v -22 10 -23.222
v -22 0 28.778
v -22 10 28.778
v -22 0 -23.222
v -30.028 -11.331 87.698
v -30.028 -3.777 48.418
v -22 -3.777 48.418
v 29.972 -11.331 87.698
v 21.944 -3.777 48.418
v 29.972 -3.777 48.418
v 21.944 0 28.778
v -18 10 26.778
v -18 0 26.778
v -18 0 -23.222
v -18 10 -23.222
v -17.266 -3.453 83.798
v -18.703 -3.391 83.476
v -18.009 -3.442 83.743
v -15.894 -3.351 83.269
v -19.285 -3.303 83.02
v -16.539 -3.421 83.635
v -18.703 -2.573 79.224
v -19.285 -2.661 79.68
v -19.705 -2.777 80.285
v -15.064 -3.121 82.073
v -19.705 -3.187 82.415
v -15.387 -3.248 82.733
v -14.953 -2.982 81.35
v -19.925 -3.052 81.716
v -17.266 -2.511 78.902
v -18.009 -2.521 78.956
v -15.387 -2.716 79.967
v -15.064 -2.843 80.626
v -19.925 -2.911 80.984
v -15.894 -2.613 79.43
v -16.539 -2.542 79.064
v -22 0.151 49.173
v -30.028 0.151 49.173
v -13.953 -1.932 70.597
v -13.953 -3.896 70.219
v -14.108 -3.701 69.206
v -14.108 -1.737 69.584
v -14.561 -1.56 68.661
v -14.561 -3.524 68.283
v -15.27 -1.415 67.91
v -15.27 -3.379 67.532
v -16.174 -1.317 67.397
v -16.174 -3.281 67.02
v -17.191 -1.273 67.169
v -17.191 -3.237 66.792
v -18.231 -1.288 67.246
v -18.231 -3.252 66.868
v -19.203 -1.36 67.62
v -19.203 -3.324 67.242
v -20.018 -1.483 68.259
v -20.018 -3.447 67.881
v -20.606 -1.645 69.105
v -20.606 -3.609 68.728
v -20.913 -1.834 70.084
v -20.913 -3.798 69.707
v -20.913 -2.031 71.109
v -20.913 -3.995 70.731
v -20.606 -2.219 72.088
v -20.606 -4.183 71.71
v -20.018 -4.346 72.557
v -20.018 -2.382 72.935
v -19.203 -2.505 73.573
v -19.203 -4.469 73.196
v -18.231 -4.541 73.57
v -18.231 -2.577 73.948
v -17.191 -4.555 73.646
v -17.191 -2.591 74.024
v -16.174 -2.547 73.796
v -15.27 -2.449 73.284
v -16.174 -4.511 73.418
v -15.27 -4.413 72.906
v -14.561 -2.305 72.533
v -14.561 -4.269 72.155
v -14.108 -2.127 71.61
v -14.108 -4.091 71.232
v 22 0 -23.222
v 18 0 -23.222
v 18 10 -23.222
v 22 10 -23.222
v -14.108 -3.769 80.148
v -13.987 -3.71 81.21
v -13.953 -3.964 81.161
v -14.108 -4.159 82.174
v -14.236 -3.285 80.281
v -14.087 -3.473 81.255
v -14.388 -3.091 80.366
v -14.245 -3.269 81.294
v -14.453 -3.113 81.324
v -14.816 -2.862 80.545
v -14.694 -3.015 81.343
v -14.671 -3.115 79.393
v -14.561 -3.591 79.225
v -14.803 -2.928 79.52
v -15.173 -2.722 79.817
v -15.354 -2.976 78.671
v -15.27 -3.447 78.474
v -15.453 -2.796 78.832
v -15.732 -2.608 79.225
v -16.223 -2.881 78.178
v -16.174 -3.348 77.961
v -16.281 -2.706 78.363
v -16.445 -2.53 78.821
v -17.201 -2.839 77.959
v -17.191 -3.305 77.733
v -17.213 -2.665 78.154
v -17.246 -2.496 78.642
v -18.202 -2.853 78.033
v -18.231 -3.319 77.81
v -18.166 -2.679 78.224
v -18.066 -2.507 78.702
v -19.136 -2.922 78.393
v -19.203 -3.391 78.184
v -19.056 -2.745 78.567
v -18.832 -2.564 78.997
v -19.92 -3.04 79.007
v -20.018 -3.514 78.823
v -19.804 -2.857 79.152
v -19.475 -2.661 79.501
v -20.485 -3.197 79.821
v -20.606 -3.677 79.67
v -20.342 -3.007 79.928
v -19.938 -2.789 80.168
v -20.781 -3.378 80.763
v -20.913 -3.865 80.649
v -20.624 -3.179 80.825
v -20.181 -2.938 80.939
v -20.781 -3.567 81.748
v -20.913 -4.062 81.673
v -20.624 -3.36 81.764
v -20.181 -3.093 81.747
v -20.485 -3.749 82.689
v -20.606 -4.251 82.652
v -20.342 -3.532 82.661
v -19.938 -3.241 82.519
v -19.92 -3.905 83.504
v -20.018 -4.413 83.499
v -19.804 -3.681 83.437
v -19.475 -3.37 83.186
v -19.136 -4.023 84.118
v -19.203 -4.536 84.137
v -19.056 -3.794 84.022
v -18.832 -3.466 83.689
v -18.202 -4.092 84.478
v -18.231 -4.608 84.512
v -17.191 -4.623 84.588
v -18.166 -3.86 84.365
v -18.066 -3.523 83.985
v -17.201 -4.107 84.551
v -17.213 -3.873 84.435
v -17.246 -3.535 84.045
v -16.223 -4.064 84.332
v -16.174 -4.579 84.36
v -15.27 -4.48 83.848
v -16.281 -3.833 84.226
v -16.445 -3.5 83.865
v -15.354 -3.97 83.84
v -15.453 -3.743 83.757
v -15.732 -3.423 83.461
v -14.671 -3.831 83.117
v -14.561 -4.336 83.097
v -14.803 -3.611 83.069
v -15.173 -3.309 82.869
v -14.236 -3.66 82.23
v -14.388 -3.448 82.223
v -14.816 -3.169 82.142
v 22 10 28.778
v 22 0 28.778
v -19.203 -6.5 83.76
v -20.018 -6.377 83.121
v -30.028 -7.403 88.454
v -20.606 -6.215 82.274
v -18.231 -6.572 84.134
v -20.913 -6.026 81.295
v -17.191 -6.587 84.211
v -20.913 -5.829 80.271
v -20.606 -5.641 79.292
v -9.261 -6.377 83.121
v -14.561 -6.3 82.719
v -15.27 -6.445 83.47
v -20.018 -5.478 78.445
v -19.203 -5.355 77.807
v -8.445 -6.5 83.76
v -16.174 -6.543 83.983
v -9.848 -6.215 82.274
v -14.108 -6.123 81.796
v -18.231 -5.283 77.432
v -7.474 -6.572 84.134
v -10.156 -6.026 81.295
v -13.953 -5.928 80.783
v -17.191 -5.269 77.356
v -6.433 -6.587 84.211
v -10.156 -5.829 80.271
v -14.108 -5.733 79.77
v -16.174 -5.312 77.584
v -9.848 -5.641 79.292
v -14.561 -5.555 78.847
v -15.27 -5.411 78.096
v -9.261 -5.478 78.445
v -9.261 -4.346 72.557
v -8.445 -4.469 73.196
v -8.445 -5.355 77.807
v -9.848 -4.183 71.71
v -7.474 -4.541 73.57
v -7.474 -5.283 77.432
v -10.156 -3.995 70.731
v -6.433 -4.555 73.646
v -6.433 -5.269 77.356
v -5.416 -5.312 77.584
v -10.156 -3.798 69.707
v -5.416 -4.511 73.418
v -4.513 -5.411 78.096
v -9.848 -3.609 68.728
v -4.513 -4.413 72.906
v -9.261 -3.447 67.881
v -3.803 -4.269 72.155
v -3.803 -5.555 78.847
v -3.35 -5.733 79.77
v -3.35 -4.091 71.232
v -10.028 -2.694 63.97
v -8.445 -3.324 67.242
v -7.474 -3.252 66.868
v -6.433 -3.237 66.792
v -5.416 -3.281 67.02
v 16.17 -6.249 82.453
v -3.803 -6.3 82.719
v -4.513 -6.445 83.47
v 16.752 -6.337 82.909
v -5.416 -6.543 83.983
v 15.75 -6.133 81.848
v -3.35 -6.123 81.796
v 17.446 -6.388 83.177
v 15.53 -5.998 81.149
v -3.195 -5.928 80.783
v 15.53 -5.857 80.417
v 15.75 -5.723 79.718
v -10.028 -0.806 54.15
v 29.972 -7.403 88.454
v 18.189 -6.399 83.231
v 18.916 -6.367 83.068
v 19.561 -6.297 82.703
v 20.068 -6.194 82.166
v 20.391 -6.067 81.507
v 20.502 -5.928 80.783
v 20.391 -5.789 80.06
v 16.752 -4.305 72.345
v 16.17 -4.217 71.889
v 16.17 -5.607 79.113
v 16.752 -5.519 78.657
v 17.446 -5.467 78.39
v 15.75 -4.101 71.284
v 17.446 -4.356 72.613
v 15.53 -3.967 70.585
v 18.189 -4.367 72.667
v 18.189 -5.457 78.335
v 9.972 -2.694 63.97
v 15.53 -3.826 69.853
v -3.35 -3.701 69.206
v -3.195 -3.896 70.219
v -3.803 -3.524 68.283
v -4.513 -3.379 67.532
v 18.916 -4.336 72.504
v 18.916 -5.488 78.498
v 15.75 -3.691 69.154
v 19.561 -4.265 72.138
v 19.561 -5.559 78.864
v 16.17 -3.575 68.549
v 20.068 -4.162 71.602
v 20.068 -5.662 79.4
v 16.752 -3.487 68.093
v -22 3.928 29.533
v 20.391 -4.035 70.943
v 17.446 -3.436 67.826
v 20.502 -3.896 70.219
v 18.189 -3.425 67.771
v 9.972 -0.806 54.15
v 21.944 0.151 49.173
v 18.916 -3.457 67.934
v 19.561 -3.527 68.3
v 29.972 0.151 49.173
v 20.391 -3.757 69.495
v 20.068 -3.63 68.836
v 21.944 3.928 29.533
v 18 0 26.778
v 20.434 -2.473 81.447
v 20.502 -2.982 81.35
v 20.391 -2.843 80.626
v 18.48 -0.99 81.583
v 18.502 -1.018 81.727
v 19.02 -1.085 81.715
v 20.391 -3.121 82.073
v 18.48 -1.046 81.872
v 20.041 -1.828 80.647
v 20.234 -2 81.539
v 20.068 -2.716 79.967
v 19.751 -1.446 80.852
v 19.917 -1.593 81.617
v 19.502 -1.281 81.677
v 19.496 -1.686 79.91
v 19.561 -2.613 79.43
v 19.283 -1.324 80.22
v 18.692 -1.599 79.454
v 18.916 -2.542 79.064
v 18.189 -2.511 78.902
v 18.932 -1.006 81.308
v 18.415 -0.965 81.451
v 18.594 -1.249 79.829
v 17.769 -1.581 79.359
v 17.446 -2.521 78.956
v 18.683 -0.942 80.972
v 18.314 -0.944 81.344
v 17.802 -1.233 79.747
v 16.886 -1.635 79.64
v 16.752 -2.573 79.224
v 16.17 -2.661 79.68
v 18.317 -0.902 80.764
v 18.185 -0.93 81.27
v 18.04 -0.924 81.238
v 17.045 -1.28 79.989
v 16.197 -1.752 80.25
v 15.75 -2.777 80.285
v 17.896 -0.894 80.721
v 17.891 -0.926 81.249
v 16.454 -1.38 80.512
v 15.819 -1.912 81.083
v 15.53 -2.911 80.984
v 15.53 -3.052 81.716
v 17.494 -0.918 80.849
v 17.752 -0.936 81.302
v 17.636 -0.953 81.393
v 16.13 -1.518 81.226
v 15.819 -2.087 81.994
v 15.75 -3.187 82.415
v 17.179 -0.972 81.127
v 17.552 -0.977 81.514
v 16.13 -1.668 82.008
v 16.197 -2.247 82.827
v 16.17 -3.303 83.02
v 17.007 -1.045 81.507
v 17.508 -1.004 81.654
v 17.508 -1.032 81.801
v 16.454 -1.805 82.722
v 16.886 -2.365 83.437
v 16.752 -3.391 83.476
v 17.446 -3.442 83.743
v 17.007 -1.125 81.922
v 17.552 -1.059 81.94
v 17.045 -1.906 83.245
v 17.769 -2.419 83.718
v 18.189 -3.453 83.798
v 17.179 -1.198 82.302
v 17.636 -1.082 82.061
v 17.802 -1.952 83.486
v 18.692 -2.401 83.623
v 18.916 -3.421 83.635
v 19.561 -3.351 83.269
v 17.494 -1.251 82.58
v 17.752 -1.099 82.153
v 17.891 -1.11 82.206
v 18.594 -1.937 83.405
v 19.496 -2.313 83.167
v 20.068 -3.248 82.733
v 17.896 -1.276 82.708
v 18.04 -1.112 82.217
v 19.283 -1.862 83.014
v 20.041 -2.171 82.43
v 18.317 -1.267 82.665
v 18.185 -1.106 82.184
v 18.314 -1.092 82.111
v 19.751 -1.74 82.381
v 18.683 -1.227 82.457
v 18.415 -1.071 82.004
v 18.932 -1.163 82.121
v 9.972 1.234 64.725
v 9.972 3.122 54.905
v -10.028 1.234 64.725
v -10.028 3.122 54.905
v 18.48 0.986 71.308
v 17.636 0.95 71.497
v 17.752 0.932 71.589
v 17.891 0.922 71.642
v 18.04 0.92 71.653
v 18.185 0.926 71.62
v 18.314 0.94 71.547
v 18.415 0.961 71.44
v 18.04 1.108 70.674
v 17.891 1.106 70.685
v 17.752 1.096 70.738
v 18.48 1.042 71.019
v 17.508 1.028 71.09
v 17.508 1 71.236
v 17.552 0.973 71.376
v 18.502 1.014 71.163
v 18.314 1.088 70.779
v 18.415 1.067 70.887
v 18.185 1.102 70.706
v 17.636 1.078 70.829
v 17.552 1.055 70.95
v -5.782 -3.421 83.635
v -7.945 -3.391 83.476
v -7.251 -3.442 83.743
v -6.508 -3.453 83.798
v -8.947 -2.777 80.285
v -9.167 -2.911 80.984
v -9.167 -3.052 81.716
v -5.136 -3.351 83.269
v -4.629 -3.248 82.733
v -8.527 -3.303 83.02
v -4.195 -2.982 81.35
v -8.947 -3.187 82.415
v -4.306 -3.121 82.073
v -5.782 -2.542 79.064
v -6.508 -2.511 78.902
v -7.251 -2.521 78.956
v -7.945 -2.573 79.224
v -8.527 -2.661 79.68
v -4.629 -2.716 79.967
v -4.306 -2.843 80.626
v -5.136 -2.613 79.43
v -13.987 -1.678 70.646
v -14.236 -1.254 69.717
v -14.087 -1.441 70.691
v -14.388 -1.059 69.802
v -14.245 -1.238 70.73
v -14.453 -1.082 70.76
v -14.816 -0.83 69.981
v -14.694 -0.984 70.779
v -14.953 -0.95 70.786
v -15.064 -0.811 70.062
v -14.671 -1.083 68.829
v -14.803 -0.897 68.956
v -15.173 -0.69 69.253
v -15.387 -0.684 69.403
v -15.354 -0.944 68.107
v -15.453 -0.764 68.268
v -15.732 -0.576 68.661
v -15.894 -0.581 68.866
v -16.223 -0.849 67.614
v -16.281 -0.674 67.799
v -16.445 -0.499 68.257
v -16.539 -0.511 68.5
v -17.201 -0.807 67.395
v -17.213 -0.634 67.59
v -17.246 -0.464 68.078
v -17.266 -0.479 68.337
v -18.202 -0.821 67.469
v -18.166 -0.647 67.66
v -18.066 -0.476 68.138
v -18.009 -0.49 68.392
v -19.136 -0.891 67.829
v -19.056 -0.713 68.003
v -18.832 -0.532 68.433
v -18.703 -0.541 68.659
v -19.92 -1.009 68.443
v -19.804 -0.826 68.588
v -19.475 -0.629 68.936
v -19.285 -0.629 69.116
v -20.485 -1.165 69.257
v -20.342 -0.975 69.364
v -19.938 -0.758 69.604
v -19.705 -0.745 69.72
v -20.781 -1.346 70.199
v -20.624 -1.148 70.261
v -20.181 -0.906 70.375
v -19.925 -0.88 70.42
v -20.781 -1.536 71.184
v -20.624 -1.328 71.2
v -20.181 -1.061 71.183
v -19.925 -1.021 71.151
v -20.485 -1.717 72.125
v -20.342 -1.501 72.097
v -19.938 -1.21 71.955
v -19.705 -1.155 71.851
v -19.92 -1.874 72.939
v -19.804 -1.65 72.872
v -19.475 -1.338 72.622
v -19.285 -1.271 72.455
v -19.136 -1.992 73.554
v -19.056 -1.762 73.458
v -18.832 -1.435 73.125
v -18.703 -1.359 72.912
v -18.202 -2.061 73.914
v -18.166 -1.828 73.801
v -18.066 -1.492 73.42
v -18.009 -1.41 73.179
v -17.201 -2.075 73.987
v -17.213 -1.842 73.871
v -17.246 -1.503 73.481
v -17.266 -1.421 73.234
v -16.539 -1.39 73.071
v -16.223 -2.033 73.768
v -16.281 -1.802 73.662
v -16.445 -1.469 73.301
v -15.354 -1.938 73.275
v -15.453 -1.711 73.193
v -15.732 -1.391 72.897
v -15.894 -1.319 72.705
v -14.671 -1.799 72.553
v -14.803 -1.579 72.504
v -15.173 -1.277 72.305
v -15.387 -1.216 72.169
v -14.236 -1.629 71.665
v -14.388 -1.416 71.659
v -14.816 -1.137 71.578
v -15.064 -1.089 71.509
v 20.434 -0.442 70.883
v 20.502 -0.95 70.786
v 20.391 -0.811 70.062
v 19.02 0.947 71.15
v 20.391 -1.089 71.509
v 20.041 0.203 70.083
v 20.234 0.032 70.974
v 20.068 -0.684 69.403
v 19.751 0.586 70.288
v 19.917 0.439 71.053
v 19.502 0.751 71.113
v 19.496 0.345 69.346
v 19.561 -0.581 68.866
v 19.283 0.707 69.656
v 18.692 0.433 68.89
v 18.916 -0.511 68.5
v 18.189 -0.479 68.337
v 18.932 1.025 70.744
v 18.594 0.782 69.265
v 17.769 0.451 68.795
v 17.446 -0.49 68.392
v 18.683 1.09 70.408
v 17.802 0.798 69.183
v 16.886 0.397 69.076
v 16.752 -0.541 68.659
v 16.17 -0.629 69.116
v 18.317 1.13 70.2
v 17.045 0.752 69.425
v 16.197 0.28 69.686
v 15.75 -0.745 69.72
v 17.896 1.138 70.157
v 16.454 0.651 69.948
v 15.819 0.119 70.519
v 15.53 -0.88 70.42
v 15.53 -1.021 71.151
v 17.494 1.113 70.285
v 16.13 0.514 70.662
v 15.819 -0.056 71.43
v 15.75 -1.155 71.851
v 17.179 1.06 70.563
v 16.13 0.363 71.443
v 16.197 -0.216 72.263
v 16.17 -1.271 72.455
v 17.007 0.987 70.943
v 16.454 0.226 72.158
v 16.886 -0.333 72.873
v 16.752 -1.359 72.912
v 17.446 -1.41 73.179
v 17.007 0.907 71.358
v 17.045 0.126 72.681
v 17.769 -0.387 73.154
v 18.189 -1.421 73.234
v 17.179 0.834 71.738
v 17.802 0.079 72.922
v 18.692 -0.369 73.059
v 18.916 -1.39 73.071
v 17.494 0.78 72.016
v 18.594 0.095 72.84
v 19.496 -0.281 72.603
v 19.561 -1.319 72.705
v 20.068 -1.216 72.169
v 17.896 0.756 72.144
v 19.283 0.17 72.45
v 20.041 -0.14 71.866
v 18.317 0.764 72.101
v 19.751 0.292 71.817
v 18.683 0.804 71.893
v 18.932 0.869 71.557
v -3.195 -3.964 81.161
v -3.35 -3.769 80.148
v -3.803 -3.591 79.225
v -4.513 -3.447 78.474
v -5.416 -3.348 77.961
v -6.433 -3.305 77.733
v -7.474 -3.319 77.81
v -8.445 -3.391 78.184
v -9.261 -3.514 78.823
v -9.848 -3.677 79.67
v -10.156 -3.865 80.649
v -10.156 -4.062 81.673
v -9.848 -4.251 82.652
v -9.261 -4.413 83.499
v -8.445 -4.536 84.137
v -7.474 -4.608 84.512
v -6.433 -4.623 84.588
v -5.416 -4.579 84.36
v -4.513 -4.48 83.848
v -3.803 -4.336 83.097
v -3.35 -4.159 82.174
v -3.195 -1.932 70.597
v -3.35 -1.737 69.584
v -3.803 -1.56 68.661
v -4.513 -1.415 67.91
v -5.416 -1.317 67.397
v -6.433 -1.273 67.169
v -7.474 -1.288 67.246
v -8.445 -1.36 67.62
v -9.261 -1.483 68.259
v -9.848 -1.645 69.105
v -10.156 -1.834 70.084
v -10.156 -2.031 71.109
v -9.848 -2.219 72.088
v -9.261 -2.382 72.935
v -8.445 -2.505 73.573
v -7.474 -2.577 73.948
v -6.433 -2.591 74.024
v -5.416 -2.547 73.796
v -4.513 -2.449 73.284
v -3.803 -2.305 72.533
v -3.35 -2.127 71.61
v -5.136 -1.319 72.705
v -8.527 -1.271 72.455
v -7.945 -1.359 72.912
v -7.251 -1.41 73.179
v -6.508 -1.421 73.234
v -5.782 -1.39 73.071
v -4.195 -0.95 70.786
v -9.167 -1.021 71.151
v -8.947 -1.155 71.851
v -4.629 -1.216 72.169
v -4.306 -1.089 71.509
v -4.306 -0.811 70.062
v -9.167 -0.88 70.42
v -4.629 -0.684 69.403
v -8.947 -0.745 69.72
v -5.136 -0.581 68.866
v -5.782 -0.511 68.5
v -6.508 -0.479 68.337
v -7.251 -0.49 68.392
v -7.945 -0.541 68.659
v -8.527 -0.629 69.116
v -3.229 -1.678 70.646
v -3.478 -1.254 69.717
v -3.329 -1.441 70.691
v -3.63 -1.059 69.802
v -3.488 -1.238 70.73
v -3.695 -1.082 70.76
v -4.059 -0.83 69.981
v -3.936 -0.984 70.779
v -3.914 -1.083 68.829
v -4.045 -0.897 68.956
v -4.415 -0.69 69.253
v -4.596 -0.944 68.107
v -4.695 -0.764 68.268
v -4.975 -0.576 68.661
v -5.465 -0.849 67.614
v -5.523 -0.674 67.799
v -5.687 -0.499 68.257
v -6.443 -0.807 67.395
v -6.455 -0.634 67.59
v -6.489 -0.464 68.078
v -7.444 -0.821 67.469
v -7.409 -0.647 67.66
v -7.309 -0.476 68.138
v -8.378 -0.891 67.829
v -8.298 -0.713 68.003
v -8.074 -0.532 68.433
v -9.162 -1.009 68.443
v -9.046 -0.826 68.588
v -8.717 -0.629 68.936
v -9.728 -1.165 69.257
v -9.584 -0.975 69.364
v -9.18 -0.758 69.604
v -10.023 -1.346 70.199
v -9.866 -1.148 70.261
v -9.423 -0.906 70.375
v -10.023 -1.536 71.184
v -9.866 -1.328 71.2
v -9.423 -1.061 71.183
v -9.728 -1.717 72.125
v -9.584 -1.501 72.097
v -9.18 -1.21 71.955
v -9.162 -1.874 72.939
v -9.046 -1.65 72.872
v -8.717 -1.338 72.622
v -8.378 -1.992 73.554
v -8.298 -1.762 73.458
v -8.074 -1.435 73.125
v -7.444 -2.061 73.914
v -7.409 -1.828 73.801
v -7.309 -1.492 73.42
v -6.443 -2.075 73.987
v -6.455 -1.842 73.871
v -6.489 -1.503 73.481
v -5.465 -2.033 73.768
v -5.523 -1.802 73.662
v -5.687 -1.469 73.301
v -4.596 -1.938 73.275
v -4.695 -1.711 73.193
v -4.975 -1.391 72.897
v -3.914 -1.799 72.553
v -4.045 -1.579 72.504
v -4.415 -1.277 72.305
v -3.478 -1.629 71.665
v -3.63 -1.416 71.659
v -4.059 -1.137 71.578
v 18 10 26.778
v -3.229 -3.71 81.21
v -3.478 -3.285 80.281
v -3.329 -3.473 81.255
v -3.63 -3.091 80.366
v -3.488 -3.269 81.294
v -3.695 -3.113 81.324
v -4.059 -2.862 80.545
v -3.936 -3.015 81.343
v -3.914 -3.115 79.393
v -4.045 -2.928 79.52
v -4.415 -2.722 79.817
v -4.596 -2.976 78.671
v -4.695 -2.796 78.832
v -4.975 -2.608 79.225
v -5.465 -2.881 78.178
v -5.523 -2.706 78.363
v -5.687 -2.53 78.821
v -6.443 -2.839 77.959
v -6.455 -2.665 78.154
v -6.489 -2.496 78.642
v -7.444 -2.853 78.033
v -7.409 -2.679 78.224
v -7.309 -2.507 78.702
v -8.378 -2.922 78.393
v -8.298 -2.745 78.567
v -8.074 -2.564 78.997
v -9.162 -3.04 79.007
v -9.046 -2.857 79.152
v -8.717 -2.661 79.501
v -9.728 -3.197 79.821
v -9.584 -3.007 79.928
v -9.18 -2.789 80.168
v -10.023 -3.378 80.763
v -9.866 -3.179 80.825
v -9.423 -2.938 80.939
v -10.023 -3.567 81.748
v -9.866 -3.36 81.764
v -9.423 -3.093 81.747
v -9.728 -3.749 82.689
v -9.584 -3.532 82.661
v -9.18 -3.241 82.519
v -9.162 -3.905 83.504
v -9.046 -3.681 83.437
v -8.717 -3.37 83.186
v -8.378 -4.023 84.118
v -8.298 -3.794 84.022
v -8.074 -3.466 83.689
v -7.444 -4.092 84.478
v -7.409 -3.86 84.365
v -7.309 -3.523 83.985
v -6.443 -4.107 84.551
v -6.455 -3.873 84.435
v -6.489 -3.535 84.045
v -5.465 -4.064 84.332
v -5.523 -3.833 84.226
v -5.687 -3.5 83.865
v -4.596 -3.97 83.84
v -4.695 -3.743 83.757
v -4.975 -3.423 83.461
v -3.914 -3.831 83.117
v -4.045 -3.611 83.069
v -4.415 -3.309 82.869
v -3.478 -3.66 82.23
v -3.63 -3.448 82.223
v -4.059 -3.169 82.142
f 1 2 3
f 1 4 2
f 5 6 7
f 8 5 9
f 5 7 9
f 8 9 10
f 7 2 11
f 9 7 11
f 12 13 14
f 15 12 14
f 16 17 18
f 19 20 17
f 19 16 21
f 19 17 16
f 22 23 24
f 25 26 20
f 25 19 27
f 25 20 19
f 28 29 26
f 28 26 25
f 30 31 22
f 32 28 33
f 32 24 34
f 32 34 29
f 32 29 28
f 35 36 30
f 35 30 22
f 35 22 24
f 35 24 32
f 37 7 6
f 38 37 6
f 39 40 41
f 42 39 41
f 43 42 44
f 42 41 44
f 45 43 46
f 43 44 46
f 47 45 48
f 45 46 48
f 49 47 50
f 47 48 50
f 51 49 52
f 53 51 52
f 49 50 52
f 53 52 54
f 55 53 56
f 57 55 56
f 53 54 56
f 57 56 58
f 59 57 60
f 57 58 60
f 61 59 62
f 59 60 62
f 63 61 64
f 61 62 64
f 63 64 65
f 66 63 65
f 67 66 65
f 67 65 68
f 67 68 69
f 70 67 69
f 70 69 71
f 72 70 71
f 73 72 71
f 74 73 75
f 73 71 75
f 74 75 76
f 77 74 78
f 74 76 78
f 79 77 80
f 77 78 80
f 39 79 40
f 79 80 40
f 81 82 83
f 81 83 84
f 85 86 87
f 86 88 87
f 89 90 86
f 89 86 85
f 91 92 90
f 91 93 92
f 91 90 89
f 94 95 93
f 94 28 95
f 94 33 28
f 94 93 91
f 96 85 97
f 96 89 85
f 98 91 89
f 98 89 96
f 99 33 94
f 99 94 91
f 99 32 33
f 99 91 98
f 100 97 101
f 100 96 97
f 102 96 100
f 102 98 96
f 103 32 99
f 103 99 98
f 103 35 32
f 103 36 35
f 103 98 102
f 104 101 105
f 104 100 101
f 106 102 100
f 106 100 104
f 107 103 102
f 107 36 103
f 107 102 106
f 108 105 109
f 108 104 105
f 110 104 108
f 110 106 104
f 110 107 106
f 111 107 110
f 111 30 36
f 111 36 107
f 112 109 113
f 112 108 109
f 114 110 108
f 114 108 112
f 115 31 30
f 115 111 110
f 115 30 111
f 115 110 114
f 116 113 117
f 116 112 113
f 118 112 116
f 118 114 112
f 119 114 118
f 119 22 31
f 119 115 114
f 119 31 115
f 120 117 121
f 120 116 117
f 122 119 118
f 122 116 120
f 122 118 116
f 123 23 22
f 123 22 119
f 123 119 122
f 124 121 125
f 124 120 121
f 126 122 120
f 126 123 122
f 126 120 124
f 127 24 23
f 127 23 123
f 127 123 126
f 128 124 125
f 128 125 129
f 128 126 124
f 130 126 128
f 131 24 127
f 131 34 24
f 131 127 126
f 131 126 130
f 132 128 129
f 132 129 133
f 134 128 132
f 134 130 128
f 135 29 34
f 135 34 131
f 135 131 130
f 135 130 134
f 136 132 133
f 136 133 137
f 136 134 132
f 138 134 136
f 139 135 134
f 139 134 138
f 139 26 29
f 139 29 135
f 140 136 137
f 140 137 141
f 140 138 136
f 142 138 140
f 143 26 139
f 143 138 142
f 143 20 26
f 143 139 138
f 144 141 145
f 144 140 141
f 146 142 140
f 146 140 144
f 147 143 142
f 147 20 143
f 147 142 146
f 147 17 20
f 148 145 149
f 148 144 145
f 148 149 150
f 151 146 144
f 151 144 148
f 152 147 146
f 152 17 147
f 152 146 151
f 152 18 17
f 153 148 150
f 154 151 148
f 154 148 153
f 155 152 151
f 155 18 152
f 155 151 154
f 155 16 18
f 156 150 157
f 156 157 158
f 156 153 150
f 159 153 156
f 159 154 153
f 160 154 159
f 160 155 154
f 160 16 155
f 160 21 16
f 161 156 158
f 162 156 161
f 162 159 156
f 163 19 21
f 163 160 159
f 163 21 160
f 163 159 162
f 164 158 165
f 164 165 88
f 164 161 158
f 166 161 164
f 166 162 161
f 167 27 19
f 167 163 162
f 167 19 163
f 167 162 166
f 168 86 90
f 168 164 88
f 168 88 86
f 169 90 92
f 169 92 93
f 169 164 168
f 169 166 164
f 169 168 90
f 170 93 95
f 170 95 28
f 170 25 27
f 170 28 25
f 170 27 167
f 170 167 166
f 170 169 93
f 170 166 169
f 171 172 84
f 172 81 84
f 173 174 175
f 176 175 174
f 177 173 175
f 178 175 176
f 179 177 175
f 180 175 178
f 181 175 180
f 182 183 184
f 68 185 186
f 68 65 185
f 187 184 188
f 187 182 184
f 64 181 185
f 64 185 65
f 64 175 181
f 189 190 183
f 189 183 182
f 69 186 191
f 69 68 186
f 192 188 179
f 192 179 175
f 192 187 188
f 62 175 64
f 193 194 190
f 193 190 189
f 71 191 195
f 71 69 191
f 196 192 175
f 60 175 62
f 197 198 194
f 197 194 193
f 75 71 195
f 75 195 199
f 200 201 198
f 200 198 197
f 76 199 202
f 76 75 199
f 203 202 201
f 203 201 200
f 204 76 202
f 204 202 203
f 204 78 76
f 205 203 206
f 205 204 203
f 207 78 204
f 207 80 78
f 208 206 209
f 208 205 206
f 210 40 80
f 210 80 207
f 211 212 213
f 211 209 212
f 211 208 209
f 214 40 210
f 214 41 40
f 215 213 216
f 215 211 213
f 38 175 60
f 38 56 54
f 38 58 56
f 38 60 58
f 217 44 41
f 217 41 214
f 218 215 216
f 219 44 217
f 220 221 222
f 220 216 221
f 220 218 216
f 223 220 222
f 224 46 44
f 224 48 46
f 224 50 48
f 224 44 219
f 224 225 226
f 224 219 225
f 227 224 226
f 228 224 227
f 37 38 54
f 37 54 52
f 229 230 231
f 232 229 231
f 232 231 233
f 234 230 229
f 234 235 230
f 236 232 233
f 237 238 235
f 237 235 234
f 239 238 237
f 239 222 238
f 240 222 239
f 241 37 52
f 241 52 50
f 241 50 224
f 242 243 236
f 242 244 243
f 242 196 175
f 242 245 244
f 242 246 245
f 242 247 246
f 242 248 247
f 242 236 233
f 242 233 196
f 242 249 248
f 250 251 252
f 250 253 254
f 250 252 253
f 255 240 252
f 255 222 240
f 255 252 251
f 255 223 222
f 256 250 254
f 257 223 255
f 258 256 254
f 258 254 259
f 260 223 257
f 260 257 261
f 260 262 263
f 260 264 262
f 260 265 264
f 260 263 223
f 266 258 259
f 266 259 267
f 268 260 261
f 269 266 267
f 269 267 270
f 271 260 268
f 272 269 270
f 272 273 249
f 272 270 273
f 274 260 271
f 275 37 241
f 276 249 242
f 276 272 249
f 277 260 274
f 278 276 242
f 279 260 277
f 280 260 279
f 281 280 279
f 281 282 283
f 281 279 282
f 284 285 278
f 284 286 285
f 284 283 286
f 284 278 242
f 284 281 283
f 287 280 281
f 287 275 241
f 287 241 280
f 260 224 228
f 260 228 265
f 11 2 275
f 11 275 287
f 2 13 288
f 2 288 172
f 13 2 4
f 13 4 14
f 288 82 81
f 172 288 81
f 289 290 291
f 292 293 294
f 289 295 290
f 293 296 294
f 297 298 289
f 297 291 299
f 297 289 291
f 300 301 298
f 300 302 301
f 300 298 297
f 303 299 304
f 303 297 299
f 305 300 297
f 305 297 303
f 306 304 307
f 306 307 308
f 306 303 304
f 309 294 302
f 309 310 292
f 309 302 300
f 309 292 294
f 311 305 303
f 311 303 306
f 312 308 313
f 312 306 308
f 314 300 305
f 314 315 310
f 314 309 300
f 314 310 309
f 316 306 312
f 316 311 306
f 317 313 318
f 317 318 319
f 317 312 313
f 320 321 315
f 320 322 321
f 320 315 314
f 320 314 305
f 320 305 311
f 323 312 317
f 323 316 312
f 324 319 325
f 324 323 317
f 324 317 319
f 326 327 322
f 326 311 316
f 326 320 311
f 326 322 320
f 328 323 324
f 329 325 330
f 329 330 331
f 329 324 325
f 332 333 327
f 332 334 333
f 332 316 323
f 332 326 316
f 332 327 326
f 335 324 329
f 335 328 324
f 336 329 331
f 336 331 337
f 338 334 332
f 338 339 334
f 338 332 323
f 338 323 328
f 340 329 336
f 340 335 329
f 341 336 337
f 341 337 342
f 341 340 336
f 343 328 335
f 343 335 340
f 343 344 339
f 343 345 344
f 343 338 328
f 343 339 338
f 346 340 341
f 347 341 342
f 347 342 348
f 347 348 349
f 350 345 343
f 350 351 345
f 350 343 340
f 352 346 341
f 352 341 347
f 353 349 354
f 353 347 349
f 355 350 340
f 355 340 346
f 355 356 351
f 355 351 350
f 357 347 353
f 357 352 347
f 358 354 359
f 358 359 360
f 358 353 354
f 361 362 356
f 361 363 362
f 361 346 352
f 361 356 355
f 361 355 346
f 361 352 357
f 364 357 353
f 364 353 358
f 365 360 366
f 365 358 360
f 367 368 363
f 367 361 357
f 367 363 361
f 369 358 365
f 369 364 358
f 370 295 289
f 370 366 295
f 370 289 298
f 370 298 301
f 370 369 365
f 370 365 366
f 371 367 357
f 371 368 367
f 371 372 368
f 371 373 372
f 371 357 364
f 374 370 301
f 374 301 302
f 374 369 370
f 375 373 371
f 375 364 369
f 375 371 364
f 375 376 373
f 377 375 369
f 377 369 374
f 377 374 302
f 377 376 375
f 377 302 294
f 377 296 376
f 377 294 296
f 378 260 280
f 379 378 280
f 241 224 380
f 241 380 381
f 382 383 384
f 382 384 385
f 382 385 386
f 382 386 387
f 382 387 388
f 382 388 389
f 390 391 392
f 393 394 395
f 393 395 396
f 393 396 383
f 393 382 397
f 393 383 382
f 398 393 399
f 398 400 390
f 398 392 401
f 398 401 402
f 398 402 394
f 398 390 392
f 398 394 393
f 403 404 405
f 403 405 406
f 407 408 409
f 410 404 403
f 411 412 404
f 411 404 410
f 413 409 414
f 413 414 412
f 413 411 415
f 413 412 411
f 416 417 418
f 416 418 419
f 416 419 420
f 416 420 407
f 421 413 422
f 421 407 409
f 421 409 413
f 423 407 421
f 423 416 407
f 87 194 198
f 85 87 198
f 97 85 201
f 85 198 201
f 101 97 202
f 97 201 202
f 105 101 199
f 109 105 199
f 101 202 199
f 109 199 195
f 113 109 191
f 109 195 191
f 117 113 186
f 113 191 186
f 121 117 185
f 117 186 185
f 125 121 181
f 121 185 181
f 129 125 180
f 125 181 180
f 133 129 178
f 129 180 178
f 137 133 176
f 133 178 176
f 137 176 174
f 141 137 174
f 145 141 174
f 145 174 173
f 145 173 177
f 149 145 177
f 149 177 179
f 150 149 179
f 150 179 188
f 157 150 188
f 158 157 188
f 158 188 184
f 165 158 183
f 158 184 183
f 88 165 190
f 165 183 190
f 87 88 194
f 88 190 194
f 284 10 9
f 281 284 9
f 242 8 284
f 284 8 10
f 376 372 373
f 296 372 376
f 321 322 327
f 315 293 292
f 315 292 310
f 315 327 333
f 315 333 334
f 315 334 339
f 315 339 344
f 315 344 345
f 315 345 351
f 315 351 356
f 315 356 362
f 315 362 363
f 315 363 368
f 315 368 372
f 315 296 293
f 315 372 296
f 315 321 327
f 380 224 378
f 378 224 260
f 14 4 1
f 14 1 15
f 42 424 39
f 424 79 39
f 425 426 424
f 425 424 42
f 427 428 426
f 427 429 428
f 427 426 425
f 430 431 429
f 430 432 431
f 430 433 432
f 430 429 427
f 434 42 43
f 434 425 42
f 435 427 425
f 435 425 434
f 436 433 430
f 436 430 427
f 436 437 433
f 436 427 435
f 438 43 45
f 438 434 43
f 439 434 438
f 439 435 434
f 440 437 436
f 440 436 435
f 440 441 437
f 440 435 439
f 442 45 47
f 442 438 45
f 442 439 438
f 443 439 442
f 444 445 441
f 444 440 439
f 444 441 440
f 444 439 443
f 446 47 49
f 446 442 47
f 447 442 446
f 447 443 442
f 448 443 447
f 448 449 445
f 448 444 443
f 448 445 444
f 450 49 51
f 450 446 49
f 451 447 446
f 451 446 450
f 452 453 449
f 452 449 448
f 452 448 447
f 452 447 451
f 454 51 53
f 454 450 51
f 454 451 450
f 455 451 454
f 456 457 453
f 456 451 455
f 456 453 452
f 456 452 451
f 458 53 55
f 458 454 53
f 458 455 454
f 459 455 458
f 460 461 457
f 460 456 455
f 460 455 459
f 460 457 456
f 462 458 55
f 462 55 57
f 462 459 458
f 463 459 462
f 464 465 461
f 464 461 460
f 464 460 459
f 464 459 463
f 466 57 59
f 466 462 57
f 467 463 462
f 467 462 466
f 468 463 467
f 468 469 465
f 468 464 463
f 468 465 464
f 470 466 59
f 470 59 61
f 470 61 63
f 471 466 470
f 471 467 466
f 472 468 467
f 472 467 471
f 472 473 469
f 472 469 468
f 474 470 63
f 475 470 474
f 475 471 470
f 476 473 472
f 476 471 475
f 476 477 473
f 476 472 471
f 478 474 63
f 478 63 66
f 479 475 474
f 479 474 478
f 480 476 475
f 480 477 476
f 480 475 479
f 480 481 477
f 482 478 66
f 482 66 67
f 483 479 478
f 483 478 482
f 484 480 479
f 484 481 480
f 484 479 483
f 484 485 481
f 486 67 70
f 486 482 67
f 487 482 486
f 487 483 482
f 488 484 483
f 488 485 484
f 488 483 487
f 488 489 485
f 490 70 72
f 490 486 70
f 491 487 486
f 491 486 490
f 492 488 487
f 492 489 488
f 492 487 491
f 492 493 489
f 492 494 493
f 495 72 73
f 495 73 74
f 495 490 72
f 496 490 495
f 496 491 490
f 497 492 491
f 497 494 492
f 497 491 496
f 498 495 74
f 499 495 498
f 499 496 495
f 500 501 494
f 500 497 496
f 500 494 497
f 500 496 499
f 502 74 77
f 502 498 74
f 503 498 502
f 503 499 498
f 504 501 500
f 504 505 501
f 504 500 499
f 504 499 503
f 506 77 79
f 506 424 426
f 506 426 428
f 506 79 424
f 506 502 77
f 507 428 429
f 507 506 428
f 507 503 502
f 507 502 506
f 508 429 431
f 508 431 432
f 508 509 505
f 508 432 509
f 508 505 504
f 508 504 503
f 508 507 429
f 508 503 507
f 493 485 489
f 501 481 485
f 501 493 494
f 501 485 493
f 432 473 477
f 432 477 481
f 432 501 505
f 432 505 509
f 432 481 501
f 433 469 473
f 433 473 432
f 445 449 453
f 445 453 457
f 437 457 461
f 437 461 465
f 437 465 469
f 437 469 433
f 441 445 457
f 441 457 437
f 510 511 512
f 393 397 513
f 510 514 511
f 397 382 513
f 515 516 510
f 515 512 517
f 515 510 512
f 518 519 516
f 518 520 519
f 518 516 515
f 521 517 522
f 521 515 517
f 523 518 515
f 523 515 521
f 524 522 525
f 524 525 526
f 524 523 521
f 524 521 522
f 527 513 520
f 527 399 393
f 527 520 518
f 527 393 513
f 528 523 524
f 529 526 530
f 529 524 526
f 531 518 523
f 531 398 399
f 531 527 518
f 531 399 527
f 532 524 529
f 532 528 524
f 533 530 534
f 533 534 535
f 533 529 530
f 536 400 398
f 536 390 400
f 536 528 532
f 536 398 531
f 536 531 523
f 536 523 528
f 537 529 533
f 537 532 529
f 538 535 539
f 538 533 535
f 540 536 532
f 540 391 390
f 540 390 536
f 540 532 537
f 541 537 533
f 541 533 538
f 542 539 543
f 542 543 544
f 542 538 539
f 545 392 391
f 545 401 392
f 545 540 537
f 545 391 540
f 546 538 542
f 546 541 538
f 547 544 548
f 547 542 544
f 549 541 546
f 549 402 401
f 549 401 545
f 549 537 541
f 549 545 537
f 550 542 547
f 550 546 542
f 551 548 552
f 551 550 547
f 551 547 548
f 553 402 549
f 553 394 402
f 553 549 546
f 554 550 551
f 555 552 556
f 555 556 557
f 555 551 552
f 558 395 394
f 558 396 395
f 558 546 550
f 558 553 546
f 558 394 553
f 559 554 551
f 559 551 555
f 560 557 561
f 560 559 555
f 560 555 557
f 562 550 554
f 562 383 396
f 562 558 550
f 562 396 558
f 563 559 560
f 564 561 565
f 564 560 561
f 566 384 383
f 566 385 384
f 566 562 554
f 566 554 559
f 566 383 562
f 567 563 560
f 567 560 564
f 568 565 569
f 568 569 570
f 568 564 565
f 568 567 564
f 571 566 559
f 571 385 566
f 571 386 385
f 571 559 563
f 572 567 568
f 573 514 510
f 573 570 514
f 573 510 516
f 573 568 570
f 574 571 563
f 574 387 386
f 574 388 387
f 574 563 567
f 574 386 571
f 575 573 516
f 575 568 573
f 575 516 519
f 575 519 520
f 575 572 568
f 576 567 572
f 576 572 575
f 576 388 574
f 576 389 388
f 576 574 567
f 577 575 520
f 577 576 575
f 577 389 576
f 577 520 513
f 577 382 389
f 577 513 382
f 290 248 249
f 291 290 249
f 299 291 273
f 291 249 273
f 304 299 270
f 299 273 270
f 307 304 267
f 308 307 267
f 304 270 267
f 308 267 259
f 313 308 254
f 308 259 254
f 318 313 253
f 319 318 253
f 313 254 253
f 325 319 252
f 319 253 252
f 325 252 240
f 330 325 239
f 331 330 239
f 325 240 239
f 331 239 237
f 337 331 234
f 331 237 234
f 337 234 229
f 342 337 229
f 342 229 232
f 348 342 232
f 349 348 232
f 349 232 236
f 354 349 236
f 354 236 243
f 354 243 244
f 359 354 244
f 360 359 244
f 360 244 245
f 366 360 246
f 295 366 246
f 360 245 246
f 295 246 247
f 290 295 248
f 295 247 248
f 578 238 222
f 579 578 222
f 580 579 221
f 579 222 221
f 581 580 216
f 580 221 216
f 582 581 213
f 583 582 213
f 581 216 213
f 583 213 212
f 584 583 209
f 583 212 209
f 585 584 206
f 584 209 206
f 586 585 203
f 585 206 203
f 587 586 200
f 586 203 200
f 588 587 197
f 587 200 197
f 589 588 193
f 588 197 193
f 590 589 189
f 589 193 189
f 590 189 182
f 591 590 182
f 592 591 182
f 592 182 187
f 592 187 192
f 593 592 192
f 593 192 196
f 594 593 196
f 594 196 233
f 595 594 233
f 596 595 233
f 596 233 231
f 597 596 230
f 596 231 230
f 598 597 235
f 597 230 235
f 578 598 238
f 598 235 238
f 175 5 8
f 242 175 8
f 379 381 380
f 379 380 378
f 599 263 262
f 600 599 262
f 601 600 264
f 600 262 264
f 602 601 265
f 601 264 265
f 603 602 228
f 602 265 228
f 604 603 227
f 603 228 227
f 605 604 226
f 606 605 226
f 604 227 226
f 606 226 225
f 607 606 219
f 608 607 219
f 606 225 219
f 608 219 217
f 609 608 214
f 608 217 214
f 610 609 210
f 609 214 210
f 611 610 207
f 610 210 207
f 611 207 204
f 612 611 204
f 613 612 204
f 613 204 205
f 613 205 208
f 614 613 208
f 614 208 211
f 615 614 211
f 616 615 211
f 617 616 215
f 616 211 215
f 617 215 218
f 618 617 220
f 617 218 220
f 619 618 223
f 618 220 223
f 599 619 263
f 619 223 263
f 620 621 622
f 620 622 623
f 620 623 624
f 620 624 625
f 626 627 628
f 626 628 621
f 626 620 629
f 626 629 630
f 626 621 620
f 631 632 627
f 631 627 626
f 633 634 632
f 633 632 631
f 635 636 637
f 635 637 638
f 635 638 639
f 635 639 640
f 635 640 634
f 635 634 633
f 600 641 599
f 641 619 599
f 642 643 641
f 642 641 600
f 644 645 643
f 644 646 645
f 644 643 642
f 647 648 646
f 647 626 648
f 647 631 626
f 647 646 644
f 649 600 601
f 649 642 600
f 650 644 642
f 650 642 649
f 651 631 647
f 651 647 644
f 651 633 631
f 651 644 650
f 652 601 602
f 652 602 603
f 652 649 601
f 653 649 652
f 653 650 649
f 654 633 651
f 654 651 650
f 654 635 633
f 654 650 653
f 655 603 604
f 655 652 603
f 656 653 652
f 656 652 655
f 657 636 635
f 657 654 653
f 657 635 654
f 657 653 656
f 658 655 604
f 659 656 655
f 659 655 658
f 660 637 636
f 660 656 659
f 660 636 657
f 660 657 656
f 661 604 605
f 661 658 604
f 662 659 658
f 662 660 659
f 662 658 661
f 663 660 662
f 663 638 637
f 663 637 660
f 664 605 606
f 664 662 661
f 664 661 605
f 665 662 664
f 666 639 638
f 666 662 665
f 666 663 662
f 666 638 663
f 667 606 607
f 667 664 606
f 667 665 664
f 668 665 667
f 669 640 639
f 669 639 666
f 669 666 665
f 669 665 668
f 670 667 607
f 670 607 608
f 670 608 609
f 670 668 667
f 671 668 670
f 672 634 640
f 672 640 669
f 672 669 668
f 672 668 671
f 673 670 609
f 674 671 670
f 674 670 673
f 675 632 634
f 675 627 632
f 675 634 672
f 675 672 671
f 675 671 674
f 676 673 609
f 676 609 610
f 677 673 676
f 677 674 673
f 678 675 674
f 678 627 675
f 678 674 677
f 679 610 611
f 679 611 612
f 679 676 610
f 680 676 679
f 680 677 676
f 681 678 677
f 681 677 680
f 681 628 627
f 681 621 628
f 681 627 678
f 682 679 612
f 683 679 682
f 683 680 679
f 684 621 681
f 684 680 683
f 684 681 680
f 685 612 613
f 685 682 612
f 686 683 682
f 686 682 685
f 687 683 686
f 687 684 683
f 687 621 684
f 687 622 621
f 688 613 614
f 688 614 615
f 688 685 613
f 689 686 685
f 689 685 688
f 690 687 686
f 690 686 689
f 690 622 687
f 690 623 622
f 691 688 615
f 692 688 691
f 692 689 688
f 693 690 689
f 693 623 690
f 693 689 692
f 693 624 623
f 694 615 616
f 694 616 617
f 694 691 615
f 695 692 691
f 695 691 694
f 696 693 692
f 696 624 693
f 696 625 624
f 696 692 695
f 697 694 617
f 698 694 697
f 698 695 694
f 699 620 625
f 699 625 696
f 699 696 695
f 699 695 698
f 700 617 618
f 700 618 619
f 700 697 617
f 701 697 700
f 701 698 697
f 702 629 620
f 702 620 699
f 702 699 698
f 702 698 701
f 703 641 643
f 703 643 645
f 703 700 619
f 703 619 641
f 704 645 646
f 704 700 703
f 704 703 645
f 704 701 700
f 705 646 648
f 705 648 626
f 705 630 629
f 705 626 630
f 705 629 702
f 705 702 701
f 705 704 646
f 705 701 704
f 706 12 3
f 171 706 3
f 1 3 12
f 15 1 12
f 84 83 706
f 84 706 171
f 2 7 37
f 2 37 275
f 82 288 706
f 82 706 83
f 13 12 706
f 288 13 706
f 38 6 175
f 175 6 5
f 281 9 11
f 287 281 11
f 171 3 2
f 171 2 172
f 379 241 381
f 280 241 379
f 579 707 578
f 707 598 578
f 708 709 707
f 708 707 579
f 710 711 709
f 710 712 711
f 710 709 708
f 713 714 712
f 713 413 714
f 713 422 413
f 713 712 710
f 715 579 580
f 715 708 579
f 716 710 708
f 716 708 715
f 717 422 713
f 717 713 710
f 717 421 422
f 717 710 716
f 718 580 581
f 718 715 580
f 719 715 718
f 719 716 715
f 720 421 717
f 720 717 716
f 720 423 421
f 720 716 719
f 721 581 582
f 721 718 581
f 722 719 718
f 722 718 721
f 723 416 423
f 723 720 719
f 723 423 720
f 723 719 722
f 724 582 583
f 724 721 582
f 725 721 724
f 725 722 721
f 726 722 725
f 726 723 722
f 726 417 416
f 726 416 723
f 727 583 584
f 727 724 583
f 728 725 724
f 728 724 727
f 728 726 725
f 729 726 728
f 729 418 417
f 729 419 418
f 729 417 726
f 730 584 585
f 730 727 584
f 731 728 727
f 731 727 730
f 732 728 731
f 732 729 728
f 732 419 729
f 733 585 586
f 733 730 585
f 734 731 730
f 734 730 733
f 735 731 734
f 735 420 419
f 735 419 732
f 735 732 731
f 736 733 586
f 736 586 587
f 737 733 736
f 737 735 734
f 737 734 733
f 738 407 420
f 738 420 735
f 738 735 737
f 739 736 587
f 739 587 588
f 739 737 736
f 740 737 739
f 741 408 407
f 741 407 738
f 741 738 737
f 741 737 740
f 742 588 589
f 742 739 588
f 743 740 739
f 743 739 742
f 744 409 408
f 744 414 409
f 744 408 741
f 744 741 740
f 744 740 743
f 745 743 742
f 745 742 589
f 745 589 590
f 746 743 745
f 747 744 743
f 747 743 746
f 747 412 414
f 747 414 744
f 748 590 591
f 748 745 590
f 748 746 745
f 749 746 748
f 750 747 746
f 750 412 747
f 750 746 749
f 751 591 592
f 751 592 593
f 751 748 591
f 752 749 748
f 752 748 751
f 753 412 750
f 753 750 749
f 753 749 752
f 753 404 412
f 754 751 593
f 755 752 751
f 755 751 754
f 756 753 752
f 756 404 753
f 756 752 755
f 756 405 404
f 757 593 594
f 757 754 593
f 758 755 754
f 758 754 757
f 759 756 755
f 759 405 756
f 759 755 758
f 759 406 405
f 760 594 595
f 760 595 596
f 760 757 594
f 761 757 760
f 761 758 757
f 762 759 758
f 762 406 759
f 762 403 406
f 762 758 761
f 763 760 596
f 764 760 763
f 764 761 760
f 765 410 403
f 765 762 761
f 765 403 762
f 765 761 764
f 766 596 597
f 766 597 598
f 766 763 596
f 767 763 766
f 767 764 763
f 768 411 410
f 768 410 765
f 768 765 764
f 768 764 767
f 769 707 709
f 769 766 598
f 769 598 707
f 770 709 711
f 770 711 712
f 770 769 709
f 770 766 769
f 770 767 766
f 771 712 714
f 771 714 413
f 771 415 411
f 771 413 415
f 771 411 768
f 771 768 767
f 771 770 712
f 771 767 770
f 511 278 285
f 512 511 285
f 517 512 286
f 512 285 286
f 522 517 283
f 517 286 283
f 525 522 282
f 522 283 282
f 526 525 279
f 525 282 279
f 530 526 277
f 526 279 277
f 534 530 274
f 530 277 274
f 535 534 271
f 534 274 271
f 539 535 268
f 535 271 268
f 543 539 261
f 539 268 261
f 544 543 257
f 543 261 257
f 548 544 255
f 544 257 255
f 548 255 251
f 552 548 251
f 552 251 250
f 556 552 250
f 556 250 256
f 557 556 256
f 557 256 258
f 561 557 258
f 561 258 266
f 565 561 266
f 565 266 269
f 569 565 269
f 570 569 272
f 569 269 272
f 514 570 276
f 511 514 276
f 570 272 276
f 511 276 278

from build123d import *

# Parameters (mm, degrees)
SKETCH1_W             = 4
SKETCH1_H             = 50
BOSS_EXTRUDE1_DEPTH   = 10
BOSS_EXTRUDE1_2_DEPTH = 10
SKETCH2_W             = 44
SKETCH2_H             = 10
BOSS_EXTRUDE2_DEPTH   = 2
BOSS_EXTRUDE3_DEPTH   = 4
SKETCH4_W             = 20
SKETCH4_H             = 10
BOSS_EXTRUDE4_DEPTH   = 4
SKETCH4_3_R           = 3.5
BOSS_EXTRUDE5_DEPTH   = 3
SKETCH4_4_R           = 3.5
BOSS_EXTRUDE6_DEPTH   = 3
SKETCH4_5_R           = 2.5
BOSS_EXTRUDE7_DEPTH   = 5
FILLET1_R             = 2
FILLET2_R             = 1


with BuildPart() as part:
    # Sketch1 → Boss-Extrude1 (new body)
    with BuildSketch(Plane(origin=(0, 0, 0), x_dir=(1, 0, 0), z_dir=(0, 1, 0))):
        with Locations((20, -1.777777778)):
            Rectangle(SKETCH1_W, SKETCH1_H)
    extrude(amount=BOSS_EXTRUDE1_DEPTH)



with BuildPart() as body_2:
    # Sketch1 → Boss-Extrude1 2 (new body)
    with BuildSketch(Plane(origin=(0, 0, 0), x_dir=(1, 0, 0), z_dir=(0, 1, 0))):
        with Locations((-20, -1.777777778)):
            Rectangle(SKETCH1_W, SKETCH1_H)
    extrude(amount=BOSS_EXTRUDE1_2_DEPTH)


with BuildPart() as part_1:
    add(part.part)

    add(body_2.part)  # Boss-Extrude2 merges body 2
    # Sketch2 → Boss-Extrude2 (add)
    with BuildSketch(Plane.XY.offset(26.777777778)):
        with Locations((0, 5)):
            Rectangle(SKETCH2_W, SKETCH2_H)
    extrude(amount=BOSS_EXTRUDE2_DEPTH)


with BuildPart() as body_2_2:
    # Sketch3 → Boss-Extrude3 (new body)
    with BuildSketch(Plane(origin=(0, 5.336820415, 1.026311618), x_dir=(1, 0, 0), z_dir=(0, 0.9820064469806474, 0.18884739365012448))):
        Polygon((21.94373702, -28.259963308), (-22, -28.259963308), (-22, -48.259963308), (-30.02813149, -48.259963308), (-30.02813149, -88.259963308), (29.97186851, -88.259963308), (29.97186851, -48.259963308), (21.94373702, -48.259963308), align=None)
    extrude(amount=BOSS_EXTRUDE3_DEPTH)

    # Sketch4 → Boss-Extrude4 (add)
    with BuildSketch(Plane(origin=(0, 9.264846203, 1.781701193), x_dir=(1, 0, 0), z_dir=(0, 0.9820064469806474, 0.18884739365012448))):
        with Locations((-0.02813149, -58.327524377)):
            Rectangle(SKETCH4_W, SKETCH4_H)
    extrude(amount=BOSS_EXTRUDE4_DEPTH)

    # Sketch4<3> → Boss-Extrude5 (add)
    with BuildSketch(Plane(origin=(0, 9.264846203, 1.781701193), x_dir=(1, 0, 0), z_dir=(0, 0.9820064469806474, 0.18884739365012448))):
        with Locations((-6.694869848, -69.69133671)):
            Circle(SKETCH4_3_R)
    extrude(amount=BOSS_EXTRUDE5_DEPTH)

    # Sketch4<4> → Boss-Extrude6 (add)
    with BuildSketch(Plane(origin=(0, 9.264846203, 1.781701193), x_dir=(1, 0, 0), z_dir=(0, 0.9820064469806474, 0.18884739365012448))):
        with Locations((-17.452561289, -69.69133671)):
            Circle(SKETCH4_4_R)
        with Locations((-17.452561289, -80.449028151)):
            Circle(SKETCH4_4_R)
        with Locations((-6.694869848, -80.449028151)):
            Circle(SKETCH4_4_R)
    extrude(amount=BOSS_EXTRUDE6_DEPTH)

    # Sketch4<5> → Boss-Extrude7 (add)
    with BuildSketch(Plane(origin=(0, 9.264846203, 1.781701193), x_dir=(1, 0, 0), z_dir=(0, 0.9820064469806474, 0.18884739365012448))):
        with Locations((18.002365433, -69.69133671)):
            Circle(SKETCH4_5_R)
        with Locations((18.002365433, -80.449028151)):
            Circle(SKETCH4_5_R)
    extrude(amount=BOSS_EXTRUDE7_DEPTH)

    # Fillet1
    fillet1_edges = [body_2_2.edges().sort_by_distance(p)[0] for p in [
        (15.502365433, -1.01771085, 81.727402459),
        (15.502365433, 1.01385114, 71.163280109),
    ]]
    fillet(fillet1_edges, radius=FILLET1_R)

    # Fillet2
    fillet2_edges = [body_2_2.edges().sort_by_distance(p)[0] for p in [
        (-20.952561289, -2.981723744, 81.349707672),
        (-10.194869848, -2.981723744, 81.349707672),
        (-10.194869848, -0.950161753, 70.785585322),
        (-20.952561289, -0.950161753, 70.785585322),
    ]]
    fillet(fillet2_edges, radius=FILLET2_R)


solid = Compound([part_1.part, body_2_2.part])
